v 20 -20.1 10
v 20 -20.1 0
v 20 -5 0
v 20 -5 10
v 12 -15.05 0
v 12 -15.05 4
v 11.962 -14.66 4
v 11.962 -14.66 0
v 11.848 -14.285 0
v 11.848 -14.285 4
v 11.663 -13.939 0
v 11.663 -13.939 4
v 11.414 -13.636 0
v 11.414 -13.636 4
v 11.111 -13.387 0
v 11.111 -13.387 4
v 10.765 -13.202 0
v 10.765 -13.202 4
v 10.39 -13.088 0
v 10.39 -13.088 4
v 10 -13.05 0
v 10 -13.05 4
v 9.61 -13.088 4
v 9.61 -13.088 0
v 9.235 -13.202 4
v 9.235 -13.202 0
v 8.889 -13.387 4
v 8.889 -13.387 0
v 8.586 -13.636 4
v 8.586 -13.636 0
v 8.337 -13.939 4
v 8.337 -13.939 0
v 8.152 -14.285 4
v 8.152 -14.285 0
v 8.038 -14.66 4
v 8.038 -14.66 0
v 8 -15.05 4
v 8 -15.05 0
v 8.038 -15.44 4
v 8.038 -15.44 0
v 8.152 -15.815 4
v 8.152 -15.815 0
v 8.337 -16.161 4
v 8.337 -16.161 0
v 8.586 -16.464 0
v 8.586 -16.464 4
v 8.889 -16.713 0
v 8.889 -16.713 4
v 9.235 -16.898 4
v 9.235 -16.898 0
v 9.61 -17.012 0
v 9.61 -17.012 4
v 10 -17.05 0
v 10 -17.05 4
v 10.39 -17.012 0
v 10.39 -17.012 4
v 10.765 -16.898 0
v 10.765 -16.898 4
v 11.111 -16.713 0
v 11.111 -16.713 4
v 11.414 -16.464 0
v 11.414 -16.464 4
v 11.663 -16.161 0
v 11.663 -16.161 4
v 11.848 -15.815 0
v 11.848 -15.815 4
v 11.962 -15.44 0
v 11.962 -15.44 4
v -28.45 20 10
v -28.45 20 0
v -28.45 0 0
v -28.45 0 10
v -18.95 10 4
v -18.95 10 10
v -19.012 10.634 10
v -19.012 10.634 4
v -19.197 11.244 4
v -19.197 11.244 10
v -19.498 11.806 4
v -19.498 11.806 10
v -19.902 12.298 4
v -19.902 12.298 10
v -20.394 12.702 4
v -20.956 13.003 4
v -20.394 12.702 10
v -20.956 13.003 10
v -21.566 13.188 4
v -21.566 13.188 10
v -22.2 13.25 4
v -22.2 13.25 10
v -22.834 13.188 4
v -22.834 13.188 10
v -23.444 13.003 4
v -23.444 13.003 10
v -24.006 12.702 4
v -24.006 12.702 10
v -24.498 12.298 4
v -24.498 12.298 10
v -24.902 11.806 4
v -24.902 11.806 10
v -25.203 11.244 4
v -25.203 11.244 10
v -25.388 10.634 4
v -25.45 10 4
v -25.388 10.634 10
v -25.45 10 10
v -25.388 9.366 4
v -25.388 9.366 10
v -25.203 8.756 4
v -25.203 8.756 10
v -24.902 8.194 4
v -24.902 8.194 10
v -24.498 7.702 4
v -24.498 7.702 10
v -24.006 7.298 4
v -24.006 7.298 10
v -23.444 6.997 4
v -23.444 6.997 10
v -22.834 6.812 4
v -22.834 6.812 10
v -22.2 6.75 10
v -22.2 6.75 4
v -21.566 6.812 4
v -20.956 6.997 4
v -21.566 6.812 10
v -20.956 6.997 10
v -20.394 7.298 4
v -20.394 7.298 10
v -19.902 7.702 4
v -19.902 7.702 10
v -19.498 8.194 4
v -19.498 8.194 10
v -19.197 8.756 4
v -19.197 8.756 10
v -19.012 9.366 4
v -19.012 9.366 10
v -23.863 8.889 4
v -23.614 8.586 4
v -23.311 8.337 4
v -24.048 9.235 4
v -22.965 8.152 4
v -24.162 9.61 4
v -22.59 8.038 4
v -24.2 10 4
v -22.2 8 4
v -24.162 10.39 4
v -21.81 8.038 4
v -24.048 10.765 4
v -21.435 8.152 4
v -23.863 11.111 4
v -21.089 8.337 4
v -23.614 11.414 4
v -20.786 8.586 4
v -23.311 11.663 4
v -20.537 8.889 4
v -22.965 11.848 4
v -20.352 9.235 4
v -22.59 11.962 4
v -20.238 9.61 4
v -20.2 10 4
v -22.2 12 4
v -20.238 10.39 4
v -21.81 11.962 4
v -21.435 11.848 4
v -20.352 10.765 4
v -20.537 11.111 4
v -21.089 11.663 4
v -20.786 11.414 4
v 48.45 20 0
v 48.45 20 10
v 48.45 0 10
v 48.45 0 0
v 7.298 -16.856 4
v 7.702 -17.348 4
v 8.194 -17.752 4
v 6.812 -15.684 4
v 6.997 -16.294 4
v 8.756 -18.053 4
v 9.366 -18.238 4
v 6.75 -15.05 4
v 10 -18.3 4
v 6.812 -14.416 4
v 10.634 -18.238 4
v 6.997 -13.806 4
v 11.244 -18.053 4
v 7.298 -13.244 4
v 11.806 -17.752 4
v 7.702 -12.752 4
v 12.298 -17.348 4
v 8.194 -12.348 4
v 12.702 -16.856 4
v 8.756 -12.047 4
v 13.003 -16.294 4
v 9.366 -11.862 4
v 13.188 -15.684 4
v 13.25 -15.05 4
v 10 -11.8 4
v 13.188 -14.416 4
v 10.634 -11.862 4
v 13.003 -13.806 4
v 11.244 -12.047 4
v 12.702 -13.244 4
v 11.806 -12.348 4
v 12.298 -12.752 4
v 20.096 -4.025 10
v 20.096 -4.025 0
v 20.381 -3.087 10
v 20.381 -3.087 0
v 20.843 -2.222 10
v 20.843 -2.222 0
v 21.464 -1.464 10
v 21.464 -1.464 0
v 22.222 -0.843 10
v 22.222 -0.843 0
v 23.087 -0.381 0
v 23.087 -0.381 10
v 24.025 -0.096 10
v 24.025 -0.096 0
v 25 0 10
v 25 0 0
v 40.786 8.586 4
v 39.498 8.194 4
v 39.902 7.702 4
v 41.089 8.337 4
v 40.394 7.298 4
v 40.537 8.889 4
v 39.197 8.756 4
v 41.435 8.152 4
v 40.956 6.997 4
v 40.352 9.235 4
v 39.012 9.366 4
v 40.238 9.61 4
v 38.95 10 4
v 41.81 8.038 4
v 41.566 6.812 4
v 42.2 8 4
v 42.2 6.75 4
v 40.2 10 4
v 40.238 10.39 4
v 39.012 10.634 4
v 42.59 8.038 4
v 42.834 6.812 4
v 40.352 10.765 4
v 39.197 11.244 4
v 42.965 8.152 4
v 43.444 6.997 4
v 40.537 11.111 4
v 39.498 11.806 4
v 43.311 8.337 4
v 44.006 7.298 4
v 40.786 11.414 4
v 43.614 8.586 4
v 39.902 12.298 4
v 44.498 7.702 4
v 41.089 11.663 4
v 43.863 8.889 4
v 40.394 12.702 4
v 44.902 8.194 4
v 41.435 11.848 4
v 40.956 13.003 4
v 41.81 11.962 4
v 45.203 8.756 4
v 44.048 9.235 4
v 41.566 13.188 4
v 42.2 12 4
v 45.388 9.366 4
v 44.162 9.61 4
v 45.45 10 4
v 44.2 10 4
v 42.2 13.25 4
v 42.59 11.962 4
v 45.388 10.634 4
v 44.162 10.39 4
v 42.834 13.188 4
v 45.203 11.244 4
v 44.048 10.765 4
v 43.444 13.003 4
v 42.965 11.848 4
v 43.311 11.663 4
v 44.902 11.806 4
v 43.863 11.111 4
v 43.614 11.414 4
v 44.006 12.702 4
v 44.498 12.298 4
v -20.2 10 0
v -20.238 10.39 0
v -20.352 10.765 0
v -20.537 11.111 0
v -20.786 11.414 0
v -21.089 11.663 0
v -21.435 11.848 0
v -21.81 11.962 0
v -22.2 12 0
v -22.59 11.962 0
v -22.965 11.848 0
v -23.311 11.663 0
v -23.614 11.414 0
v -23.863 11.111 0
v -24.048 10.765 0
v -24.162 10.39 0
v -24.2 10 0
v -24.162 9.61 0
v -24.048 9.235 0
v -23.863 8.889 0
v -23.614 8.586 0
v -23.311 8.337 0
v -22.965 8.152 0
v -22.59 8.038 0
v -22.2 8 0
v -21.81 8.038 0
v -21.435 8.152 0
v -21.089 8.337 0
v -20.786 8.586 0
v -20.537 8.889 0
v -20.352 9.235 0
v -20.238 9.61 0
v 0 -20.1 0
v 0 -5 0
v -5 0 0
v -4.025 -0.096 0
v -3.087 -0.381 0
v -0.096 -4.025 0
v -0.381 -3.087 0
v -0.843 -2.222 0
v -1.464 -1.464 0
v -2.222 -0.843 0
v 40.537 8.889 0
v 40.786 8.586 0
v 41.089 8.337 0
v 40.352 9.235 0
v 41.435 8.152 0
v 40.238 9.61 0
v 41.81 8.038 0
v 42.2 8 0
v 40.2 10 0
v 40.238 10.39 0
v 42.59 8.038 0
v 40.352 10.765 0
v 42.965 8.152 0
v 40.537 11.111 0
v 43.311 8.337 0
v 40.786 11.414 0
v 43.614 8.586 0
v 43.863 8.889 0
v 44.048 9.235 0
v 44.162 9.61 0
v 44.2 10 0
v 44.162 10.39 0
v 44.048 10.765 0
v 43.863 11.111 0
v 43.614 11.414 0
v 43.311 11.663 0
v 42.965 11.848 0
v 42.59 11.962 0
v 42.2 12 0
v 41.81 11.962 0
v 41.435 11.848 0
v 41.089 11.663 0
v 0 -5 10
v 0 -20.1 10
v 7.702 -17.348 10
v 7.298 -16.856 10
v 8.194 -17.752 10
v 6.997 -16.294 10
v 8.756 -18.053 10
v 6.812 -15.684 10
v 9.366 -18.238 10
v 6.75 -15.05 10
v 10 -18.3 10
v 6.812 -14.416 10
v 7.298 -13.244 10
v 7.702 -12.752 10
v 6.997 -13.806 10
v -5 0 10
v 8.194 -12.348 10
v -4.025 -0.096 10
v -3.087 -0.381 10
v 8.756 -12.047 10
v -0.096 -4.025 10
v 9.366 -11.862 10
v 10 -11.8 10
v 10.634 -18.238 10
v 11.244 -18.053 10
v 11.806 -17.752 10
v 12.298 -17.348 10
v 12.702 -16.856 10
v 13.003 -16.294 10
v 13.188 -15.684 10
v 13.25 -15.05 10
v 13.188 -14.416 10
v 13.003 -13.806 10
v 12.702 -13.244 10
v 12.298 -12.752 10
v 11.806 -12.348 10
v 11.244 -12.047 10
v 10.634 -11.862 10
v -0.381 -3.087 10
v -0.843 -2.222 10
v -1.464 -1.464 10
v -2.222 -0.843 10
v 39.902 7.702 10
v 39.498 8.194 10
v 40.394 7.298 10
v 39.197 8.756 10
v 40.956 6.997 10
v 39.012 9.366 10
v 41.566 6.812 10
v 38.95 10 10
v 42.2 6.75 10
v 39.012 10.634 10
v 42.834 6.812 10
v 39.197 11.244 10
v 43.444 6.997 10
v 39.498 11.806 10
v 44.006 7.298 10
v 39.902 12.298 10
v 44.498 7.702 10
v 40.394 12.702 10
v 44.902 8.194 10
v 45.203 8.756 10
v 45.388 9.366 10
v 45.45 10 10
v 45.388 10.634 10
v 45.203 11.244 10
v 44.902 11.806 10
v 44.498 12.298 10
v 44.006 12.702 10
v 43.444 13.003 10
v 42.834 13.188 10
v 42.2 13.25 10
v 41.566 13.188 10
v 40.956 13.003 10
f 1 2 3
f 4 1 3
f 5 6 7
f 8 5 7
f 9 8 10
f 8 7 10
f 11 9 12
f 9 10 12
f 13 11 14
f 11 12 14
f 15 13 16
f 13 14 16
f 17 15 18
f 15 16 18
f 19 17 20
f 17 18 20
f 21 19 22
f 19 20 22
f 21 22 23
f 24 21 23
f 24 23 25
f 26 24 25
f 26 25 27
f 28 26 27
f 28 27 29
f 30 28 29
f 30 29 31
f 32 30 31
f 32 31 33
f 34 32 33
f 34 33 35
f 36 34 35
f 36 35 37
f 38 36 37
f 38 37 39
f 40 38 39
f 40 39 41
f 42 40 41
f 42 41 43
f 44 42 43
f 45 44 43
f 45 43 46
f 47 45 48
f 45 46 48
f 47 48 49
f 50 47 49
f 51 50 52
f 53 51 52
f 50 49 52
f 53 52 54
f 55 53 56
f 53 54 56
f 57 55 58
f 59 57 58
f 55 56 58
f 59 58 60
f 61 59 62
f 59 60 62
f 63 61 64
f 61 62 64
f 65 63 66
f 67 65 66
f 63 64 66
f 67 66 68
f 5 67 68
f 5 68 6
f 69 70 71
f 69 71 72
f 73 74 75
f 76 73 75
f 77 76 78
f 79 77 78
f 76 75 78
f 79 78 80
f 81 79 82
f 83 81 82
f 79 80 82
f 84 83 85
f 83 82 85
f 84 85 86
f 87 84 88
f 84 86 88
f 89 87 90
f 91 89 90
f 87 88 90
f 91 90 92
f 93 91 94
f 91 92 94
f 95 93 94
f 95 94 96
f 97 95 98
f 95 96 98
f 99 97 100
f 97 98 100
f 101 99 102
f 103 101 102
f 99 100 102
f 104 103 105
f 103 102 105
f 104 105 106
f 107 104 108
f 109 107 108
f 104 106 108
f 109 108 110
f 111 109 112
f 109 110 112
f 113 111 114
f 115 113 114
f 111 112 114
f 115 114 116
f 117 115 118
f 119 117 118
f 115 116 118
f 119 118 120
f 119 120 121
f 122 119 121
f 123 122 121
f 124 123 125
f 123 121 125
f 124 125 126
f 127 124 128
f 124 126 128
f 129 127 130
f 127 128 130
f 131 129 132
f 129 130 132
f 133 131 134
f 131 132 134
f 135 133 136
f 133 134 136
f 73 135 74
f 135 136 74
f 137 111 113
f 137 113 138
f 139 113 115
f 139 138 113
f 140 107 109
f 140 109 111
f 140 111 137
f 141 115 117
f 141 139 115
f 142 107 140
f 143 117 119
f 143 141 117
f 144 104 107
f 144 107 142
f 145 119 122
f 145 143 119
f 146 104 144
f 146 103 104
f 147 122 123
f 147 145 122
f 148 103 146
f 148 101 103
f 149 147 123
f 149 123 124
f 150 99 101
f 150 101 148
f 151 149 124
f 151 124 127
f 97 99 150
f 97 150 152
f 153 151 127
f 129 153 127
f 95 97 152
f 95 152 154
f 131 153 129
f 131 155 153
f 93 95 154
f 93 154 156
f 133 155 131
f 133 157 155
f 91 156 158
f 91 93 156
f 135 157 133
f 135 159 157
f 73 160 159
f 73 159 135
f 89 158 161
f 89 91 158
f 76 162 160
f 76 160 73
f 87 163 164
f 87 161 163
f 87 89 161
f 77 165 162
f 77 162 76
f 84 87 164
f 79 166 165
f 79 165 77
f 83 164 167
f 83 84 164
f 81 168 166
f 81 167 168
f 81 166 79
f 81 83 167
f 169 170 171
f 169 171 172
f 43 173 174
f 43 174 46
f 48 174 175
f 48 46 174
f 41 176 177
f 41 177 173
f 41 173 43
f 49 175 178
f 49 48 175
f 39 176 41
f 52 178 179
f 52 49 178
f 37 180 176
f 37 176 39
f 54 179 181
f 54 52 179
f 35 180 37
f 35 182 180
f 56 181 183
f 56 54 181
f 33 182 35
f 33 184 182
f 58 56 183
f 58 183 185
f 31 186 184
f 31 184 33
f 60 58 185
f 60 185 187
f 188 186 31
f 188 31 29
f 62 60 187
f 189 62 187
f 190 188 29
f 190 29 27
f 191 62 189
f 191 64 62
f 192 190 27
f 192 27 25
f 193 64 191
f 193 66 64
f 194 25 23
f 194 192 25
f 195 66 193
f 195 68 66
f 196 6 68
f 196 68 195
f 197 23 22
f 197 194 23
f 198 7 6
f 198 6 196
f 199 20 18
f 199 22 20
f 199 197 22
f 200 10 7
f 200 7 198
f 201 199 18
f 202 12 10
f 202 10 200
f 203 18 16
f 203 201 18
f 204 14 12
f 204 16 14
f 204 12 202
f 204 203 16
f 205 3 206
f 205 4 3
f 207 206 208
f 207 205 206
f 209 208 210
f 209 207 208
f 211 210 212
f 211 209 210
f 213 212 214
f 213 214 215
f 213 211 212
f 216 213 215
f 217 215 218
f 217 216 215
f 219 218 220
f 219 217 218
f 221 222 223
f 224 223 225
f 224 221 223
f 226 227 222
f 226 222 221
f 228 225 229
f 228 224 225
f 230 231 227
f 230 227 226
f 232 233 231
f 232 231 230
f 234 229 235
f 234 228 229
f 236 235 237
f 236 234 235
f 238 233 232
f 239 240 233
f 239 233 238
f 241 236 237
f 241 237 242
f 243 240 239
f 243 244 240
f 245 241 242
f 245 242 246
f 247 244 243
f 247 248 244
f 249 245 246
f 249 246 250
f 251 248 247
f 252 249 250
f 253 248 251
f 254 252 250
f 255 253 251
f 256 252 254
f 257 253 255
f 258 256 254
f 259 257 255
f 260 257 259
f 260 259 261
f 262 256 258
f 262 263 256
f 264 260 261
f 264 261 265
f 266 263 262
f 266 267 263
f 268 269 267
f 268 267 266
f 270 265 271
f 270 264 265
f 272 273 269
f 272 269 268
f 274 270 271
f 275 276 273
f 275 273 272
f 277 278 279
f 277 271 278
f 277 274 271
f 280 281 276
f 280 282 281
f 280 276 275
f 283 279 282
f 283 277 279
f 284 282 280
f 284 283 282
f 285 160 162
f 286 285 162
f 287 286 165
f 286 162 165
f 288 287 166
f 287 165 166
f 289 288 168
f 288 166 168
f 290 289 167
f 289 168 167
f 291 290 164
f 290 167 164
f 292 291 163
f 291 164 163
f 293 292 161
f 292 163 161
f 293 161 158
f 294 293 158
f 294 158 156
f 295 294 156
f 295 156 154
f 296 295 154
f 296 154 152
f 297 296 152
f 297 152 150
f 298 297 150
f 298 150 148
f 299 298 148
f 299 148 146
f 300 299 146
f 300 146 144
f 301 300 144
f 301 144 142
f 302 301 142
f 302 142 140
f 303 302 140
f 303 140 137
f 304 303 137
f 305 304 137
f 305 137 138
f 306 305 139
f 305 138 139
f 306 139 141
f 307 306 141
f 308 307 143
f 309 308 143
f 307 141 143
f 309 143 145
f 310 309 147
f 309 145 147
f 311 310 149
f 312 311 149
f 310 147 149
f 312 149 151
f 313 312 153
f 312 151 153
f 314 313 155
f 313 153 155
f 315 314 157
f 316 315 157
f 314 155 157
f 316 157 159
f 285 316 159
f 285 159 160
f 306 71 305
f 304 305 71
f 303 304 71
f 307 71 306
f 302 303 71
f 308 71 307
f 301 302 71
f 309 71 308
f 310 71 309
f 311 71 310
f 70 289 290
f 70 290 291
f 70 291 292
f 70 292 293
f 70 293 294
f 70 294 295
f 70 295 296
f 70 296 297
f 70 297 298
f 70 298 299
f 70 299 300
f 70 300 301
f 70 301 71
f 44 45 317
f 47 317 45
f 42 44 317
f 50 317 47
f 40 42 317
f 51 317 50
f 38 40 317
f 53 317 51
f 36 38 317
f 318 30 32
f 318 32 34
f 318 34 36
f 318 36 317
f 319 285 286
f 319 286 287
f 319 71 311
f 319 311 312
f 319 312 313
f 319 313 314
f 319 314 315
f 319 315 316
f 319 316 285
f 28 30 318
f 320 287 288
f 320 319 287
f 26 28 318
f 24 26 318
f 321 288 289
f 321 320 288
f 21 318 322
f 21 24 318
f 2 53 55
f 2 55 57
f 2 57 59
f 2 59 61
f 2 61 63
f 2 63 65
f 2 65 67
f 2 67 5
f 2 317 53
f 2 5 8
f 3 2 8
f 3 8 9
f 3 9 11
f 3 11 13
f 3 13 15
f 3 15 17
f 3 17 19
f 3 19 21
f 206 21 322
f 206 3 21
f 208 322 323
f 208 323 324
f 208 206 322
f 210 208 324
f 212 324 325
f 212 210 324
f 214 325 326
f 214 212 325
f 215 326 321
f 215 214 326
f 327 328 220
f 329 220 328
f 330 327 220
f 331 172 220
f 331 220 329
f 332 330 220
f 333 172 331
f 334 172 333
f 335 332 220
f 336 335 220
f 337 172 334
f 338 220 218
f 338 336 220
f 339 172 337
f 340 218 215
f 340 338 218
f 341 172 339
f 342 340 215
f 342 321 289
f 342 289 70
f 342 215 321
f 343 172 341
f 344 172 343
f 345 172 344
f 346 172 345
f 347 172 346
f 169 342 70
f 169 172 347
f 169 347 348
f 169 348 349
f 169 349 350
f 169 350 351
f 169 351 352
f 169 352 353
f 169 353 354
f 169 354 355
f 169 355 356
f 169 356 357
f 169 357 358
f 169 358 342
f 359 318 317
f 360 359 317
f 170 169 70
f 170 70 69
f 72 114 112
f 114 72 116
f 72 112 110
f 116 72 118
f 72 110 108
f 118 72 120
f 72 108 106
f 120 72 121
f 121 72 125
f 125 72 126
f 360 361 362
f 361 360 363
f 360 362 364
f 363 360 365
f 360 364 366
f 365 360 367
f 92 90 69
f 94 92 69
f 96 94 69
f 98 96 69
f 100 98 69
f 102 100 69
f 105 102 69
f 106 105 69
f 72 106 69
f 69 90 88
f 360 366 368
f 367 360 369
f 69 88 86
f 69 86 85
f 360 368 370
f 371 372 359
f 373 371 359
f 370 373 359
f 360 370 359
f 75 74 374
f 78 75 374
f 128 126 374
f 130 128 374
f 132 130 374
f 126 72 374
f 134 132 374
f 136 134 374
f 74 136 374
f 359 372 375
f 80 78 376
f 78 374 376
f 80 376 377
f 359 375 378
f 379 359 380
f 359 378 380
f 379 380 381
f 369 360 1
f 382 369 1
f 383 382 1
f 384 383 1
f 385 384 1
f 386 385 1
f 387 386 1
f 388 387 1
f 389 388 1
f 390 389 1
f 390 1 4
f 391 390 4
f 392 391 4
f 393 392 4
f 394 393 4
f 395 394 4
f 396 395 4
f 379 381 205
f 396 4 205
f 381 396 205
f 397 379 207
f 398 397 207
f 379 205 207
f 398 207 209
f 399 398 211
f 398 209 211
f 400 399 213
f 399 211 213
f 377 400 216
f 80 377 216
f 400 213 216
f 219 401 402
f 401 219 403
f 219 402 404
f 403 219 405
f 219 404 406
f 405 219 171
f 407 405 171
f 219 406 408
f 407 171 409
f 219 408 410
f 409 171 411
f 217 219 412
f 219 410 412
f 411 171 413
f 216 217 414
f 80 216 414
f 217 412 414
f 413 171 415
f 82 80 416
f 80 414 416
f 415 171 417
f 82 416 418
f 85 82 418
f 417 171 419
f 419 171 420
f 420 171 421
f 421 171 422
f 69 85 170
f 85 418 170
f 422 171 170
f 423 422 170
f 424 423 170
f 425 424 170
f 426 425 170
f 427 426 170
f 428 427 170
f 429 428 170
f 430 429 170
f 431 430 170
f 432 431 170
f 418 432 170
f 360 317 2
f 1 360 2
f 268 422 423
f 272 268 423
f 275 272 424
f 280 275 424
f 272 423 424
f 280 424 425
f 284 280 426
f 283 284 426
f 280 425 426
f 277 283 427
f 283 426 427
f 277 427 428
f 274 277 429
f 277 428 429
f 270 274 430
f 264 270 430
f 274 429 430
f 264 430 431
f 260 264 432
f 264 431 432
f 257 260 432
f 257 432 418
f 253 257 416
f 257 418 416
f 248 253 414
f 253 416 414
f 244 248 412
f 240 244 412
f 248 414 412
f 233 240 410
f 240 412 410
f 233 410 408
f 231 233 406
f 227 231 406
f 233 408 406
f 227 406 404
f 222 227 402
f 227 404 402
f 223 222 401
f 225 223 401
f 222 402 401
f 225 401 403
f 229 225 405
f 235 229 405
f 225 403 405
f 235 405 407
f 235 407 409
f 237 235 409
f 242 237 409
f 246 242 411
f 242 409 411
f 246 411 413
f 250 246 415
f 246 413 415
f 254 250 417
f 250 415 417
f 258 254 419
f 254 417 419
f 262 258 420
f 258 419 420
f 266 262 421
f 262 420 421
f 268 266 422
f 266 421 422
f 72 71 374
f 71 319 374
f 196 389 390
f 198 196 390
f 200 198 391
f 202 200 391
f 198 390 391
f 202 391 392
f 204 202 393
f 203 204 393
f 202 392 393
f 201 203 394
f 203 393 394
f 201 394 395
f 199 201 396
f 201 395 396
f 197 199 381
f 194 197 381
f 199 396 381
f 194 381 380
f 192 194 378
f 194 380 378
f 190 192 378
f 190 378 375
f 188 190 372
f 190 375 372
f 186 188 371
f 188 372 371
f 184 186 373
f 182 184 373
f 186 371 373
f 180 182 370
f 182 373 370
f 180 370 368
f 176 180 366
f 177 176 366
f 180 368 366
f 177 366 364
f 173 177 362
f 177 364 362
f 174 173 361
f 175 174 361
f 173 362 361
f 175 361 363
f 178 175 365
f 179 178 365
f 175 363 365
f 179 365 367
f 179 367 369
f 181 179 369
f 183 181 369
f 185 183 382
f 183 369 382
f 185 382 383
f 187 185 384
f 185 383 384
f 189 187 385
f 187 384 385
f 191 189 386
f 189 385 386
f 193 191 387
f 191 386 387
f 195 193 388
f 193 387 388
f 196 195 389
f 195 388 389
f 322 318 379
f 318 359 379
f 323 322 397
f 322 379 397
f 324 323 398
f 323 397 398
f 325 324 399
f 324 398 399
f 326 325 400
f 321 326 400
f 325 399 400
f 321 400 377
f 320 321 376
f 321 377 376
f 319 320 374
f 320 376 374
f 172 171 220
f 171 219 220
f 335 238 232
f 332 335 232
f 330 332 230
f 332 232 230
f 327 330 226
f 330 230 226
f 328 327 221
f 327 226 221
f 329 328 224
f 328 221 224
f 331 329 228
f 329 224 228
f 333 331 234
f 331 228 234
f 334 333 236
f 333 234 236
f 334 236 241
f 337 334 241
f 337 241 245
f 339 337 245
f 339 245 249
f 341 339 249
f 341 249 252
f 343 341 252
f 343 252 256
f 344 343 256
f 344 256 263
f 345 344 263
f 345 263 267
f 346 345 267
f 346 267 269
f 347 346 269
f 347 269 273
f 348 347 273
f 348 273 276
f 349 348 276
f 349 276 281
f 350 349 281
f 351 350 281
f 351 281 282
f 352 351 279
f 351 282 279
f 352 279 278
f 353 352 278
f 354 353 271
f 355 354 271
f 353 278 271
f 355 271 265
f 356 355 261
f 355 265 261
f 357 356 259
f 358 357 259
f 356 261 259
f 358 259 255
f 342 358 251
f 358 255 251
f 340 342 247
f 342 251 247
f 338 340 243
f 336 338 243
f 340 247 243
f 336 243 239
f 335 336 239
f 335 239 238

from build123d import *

# Parameters (mm, degrees)
BOSS_EXTRUDE1_DEPTH = 10
SKETCH2_R           = 2
CUT_EXTRUDE1_DEPTH  = 52.590817981
SKETCH3_R           = 3.25
CUT_EXTRUDE2_DEPTH  = 6
FILLET1_R           = 5
SKETCH4_W           = 10
SKETCH4_H           = 20
BOSS_EXTRUDE2_DEPTH = 2
SKETCH5_W           = 10
SKETCH5_H           = 20
BOSS_EXTRUDE3_DEPTH = 2


with BuildPart() as part:
    # Sketch1 → Boss-Extrude1 (new body)
    with BuildSketch(Plane.XY):
        Polygon((0, 0), (0, -20.1), (20, -20.1), (20, 0), (46.45, 0), (46.45, 20), (-26.45, 20), (-26.45, 0), align=None)
    extrude(amount=BOSS_EXTRUDE1_DEPTH)

    # Sketch2 → Cut-Extrude1 (cut, through all)
    with BuildSketch(Plane.XY.offset(10)):
        with Locations((-22.2, 10)):
            Circle(SKETCH2_R)
        with Locations((10, -15.05)):
            Circle(SKETCH2_R)
        with Locations(Location((42.2, 10, 0), (0, 0, 180))):
            Circle(SKETCH2_R)
    extrude(amount=-CUT_EXTRUDE1_DEPTH, mode=Mode.SUBTRACT)

    # Sketch3 → Cut-Extrude2 (cut)
    with BuildSketch(Plane.XY.offset(10)):
        with Locations((-22.2, 10)):
            Circle(SKETCH3_R)
        with Locations((42.2, 10)):
            Circle(SKETCH3_R)
        with Locations((10, -15.05)):
            Circle(SKETCH3_R)
    extrude(amount=-CUT_EXTRUDE2_DEPTH, mode=Mode.SUBTRACT)

    # Fillet1
    fillet1_edges = [part.edges().sort_by_distance(p)[0] for p in [
        (20, 0, 5),
        (0, 0, 5),
    ]]
    fillet(fillet1_edges, radius=FILLET1_R)

    # Sketch4 → Boss-Extrude2 (add)
    with BuildSketch(Plane(origin=(46.45, 0, 0), x_dir=(0, 0, -1), z_dir=(1, 0, 0))):
        with Locations((-5, 10)):
            Rectangle(SKETCH4_W, SKETCH4_H)
    extrude(amount=BOSS_EXTRUDE2_DEPTH)

    # Sketch5 → Boss-Extrude3 (add)
    with BuildSketch(Plane.ZY.offset(26.45)):
        with Locations((5, 10)):
            Rectangle(SKETCH5_W, SKETCH5_H)
    extrude(amount=BOSS_EXTRUDE3_DEPTH)


solid = part.part
